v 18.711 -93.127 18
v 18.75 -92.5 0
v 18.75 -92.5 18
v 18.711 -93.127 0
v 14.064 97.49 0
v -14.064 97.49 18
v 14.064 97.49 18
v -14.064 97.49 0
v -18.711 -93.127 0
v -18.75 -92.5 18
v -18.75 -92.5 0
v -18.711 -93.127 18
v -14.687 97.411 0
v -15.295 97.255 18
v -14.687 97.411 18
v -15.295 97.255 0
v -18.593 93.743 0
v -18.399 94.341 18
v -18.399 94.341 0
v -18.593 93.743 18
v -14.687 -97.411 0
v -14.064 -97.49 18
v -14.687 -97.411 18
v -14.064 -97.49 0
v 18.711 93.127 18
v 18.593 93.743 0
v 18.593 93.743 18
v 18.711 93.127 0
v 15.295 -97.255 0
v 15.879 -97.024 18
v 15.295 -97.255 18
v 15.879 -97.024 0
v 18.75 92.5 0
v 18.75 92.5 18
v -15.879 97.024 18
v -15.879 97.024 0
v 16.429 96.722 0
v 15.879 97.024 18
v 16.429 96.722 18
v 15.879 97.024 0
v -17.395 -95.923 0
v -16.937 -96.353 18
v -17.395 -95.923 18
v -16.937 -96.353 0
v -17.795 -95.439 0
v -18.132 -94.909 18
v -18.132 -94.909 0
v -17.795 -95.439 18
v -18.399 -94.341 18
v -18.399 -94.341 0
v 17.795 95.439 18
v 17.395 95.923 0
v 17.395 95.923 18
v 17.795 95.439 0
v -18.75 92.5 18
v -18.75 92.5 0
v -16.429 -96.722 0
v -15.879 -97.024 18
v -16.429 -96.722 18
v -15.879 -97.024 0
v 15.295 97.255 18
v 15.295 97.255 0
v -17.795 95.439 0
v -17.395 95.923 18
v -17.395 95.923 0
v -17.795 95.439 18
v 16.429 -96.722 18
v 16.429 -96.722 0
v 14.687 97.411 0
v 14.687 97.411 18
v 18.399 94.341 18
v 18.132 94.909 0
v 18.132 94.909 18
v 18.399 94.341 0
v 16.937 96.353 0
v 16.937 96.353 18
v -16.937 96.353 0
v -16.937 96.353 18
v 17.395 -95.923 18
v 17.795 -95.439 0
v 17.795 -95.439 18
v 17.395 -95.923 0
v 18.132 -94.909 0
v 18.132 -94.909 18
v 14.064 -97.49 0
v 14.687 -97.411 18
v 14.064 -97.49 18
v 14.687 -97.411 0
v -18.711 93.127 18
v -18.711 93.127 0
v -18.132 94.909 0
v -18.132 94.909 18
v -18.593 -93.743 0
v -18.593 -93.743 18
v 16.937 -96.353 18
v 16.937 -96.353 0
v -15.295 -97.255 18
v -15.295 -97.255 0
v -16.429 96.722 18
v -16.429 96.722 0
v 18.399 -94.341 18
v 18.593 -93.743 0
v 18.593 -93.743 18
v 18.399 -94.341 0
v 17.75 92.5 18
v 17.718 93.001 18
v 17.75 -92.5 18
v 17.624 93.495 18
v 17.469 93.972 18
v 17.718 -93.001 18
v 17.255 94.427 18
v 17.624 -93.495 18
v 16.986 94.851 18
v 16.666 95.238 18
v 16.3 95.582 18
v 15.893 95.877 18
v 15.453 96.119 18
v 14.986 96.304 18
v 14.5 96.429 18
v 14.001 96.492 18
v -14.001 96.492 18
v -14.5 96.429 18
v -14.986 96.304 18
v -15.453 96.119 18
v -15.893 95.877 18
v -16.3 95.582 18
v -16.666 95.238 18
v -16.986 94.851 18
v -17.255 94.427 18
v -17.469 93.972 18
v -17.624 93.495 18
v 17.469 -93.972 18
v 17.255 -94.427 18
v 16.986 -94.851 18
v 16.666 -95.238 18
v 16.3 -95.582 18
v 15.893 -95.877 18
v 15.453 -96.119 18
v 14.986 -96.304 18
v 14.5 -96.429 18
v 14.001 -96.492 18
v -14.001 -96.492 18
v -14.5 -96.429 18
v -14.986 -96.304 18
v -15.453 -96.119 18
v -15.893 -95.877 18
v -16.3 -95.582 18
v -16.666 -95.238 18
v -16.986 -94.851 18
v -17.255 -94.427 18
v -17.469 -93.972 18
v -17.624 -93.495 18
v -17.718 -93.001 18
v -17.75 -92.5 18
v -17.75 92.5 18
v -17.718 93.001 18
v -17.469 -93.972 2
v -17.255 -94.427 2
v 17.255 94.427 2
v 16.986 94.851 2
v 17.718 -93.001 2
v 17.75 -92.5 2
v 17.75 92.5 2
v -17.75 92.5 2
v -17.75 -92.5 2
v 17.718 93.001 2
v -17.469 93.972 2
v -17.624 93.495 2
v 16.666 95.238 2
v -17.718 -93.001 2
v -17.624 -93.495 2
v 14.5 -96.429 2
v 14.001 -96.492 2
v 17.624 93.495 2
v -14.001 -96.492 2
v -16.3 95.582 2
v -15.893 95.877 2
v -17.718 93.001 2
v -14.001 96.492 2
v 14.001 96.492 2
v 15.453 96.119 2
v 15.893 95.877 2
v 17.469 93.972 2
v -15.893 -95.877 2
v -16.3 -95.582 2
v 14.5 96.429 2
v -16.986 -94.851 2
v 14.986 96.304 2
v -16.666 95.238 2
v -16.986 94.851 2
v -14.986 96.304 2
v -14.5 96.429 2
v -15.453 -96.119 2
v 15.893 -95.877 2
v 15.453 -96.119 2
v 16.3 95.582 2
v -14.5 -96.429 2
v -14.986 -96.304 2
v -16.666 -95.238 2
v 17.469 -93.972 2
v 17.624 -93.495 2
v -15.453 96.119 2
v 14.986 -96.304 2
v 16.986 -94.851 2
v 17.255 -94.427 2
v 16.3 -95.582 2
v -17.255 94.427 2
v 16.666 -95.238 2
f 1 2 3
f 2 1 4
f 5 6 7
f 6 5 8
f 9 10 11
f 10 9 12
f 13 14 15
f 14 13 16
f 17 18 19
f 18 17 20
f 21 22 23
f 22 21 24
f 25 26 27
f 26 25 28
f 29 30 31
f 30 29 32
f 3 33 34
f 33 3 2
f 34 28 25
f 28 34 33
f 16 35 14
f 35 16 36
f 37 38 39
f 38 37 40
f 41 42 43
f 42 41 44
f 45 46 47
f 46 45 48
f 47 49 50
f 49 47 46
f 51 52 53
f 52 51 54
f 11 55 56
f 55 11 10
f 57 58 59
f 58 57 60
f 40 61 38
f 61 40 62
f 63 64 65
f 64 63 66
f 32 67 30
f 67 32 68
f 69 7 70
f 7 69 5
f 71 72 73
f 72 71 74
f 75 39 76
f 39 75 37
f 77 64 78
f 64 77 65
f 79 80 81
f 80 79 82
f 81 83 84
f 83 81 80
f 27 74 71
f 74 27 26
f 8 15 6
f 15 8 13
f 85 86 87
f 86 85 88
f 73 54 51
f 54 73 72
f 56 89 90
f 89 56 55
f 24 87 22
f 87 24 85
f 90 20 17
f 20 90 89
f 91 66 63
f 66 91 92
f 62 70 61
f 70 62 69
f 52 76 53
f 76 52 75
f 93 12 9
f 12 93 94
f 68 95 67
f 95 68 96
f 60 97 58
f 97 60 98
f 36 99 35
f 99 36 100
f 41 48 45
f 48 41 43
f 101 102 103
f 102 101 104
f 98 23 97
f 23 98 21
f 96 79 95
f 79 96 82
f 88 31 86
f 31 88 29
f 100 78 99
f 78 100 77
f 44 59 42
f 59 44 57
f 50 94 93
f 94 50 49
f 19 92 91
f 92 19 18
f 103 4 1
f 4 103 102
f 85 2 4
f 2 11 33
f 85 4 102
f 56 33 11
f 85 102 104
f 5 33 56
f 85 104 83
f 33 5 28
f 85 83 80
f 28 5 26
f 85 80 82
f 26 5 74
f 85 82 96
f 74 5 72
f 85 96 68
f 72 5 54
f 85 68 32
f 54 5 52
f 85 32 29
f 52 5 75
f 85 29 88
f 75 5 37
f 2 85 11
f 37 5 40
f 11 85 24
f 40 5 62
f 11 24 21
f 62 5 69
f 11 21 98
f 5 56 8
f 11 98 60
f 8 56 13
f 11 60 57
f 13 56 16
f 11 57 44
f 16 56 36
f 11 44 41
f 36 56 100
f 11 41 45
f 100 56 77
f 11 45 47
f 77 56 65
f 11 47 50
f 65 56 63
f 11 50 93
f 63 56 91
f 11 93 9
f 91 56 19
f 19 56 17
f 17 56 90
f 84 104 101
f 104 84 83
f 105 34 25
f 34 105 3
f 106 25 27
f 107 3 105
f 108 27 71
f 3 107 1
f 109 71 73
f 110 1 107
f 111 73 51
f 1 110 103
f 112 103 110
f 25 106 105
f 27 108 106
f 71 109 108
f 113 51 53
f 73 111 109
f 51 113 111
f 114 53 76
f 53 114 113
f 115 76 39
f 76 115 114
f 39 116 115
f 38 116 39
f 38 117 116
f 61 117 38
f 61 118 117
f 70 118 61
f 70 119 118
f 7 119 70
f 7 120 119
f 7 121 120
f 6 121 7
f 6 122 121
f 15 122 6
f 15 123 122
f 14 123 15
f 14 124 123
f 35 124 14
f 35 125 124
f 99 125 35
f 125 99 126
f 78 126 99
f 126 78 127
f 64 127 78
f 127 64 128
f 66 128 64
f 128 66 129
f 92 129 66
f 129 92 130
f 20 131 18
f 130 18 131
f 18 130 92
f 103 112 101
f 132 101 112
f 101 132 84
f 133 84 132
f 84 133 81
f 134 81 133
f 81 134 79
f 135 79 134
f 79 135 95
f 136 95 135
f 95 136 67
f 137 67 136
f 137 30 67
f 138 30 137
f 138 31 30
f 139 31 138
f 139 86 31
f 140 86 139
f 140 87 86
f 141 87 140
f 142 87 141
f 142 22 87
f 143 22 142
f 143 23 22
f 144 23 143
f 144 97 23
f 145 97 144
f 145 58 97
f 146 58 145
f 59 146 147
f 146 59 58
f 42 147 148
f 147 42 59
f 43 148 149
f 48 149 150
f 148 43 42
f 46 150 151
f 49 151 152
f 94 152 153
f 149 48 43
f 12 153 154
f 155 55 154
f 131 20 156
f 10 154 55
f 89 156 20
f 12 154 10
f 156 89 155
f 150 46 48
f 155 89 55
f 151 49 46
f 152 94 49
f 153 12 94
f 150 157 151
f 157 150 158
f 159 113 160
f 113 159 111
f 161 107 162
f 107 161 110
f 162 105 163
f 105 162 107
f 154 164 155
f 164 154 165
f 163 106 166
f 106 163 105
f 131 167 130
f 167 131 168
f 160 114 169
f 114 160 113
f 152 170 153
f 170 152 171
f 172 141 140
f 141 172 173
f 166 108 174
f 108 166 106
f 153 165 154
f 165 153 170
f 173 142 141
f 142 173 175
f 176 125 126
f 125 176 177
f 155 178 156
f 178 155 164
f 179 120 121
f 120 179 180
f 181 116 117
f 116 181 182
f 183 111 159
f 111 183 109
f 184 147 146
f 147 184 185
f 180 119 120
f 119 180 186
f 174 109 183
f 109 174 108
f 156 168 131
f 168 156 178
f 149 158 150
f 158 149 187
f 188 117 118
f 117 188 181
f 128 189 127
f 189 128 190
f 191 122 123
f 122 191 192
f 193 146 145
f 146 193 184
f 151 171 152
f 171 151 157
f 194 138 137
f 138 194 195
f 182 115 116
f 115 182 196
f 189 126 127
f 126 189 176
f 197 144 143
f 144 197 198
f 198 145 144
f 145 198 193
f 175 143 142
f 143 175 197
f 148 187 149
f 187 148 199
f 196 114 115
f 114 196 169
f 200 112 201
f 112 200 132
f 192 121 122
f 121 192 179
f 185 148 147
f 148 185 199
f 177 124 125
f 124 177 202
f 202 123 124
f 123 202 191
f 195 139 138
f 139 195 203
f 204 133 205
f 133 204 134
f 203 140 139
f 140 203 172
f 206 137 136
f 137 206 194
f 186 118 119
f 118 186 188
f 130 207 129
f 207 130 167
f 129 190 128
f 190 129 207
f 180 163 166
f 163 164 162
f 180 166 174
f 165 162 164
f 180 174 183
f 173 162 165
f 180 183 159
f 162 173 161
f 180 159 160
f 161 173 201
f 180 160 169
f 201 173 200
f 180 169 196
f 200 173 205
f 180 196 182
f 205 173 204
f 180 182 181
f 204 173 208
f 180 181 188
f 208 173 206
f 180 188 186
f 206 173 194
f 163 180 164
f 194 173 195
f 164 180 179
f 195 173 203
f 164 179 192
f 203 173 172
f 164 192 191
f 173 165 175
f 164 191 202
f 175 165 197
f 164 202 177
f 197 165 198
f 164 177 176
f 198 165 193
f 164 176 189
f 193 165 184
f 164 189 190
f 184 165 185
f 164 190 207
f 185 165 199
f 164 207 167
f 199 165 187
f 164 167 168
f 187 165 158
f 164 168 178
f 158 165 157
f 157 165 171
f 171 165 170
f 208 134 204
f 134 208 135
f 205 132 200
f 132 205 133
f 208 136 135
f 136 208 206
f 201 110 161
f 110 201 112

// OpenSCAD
$fn = 50;


difference() {
	union() {
		hull() {
			translate(v = [-13.7500000000, 92.5000000000, 0]) {
				cylinder(h = 18, r = 5);
			}
			translate(v = [13.7500000000, 92.5000000000, 0]) {
				cylinder(h = 18, r = 5);
			}
			translate(v = [-13.7500000000, -92.5000000000, 0]) {
				cylinder(h = 18, r = 5);
			}
			translate(v = [13.7500000000, -92.5000000000, 0]) {
				cylinder(h = 18, r = 5);
			}
		}
	}
	union() {
		translate(v = [0, 0, 2]) {
			hull() {
				translate(v = [-13.7500000000, 92.5000000000, 0]) {
					cylinder(h = 16, r = 4);
				}
				translate(v = [13.7500000000, 92.5000000000, 0]) {
					cylinder(h = 16, r = 4);
				}
				translate(v = [-13.7500000000, -92.5000000000, 0]) {
					cylinder(h = 16, r = 4);
				}
				translate(v = [13.7500000000, -92.5000000000, 0]) {
					cylinder(h = 16, r = 4);
				}
			}
		}
	}
}
